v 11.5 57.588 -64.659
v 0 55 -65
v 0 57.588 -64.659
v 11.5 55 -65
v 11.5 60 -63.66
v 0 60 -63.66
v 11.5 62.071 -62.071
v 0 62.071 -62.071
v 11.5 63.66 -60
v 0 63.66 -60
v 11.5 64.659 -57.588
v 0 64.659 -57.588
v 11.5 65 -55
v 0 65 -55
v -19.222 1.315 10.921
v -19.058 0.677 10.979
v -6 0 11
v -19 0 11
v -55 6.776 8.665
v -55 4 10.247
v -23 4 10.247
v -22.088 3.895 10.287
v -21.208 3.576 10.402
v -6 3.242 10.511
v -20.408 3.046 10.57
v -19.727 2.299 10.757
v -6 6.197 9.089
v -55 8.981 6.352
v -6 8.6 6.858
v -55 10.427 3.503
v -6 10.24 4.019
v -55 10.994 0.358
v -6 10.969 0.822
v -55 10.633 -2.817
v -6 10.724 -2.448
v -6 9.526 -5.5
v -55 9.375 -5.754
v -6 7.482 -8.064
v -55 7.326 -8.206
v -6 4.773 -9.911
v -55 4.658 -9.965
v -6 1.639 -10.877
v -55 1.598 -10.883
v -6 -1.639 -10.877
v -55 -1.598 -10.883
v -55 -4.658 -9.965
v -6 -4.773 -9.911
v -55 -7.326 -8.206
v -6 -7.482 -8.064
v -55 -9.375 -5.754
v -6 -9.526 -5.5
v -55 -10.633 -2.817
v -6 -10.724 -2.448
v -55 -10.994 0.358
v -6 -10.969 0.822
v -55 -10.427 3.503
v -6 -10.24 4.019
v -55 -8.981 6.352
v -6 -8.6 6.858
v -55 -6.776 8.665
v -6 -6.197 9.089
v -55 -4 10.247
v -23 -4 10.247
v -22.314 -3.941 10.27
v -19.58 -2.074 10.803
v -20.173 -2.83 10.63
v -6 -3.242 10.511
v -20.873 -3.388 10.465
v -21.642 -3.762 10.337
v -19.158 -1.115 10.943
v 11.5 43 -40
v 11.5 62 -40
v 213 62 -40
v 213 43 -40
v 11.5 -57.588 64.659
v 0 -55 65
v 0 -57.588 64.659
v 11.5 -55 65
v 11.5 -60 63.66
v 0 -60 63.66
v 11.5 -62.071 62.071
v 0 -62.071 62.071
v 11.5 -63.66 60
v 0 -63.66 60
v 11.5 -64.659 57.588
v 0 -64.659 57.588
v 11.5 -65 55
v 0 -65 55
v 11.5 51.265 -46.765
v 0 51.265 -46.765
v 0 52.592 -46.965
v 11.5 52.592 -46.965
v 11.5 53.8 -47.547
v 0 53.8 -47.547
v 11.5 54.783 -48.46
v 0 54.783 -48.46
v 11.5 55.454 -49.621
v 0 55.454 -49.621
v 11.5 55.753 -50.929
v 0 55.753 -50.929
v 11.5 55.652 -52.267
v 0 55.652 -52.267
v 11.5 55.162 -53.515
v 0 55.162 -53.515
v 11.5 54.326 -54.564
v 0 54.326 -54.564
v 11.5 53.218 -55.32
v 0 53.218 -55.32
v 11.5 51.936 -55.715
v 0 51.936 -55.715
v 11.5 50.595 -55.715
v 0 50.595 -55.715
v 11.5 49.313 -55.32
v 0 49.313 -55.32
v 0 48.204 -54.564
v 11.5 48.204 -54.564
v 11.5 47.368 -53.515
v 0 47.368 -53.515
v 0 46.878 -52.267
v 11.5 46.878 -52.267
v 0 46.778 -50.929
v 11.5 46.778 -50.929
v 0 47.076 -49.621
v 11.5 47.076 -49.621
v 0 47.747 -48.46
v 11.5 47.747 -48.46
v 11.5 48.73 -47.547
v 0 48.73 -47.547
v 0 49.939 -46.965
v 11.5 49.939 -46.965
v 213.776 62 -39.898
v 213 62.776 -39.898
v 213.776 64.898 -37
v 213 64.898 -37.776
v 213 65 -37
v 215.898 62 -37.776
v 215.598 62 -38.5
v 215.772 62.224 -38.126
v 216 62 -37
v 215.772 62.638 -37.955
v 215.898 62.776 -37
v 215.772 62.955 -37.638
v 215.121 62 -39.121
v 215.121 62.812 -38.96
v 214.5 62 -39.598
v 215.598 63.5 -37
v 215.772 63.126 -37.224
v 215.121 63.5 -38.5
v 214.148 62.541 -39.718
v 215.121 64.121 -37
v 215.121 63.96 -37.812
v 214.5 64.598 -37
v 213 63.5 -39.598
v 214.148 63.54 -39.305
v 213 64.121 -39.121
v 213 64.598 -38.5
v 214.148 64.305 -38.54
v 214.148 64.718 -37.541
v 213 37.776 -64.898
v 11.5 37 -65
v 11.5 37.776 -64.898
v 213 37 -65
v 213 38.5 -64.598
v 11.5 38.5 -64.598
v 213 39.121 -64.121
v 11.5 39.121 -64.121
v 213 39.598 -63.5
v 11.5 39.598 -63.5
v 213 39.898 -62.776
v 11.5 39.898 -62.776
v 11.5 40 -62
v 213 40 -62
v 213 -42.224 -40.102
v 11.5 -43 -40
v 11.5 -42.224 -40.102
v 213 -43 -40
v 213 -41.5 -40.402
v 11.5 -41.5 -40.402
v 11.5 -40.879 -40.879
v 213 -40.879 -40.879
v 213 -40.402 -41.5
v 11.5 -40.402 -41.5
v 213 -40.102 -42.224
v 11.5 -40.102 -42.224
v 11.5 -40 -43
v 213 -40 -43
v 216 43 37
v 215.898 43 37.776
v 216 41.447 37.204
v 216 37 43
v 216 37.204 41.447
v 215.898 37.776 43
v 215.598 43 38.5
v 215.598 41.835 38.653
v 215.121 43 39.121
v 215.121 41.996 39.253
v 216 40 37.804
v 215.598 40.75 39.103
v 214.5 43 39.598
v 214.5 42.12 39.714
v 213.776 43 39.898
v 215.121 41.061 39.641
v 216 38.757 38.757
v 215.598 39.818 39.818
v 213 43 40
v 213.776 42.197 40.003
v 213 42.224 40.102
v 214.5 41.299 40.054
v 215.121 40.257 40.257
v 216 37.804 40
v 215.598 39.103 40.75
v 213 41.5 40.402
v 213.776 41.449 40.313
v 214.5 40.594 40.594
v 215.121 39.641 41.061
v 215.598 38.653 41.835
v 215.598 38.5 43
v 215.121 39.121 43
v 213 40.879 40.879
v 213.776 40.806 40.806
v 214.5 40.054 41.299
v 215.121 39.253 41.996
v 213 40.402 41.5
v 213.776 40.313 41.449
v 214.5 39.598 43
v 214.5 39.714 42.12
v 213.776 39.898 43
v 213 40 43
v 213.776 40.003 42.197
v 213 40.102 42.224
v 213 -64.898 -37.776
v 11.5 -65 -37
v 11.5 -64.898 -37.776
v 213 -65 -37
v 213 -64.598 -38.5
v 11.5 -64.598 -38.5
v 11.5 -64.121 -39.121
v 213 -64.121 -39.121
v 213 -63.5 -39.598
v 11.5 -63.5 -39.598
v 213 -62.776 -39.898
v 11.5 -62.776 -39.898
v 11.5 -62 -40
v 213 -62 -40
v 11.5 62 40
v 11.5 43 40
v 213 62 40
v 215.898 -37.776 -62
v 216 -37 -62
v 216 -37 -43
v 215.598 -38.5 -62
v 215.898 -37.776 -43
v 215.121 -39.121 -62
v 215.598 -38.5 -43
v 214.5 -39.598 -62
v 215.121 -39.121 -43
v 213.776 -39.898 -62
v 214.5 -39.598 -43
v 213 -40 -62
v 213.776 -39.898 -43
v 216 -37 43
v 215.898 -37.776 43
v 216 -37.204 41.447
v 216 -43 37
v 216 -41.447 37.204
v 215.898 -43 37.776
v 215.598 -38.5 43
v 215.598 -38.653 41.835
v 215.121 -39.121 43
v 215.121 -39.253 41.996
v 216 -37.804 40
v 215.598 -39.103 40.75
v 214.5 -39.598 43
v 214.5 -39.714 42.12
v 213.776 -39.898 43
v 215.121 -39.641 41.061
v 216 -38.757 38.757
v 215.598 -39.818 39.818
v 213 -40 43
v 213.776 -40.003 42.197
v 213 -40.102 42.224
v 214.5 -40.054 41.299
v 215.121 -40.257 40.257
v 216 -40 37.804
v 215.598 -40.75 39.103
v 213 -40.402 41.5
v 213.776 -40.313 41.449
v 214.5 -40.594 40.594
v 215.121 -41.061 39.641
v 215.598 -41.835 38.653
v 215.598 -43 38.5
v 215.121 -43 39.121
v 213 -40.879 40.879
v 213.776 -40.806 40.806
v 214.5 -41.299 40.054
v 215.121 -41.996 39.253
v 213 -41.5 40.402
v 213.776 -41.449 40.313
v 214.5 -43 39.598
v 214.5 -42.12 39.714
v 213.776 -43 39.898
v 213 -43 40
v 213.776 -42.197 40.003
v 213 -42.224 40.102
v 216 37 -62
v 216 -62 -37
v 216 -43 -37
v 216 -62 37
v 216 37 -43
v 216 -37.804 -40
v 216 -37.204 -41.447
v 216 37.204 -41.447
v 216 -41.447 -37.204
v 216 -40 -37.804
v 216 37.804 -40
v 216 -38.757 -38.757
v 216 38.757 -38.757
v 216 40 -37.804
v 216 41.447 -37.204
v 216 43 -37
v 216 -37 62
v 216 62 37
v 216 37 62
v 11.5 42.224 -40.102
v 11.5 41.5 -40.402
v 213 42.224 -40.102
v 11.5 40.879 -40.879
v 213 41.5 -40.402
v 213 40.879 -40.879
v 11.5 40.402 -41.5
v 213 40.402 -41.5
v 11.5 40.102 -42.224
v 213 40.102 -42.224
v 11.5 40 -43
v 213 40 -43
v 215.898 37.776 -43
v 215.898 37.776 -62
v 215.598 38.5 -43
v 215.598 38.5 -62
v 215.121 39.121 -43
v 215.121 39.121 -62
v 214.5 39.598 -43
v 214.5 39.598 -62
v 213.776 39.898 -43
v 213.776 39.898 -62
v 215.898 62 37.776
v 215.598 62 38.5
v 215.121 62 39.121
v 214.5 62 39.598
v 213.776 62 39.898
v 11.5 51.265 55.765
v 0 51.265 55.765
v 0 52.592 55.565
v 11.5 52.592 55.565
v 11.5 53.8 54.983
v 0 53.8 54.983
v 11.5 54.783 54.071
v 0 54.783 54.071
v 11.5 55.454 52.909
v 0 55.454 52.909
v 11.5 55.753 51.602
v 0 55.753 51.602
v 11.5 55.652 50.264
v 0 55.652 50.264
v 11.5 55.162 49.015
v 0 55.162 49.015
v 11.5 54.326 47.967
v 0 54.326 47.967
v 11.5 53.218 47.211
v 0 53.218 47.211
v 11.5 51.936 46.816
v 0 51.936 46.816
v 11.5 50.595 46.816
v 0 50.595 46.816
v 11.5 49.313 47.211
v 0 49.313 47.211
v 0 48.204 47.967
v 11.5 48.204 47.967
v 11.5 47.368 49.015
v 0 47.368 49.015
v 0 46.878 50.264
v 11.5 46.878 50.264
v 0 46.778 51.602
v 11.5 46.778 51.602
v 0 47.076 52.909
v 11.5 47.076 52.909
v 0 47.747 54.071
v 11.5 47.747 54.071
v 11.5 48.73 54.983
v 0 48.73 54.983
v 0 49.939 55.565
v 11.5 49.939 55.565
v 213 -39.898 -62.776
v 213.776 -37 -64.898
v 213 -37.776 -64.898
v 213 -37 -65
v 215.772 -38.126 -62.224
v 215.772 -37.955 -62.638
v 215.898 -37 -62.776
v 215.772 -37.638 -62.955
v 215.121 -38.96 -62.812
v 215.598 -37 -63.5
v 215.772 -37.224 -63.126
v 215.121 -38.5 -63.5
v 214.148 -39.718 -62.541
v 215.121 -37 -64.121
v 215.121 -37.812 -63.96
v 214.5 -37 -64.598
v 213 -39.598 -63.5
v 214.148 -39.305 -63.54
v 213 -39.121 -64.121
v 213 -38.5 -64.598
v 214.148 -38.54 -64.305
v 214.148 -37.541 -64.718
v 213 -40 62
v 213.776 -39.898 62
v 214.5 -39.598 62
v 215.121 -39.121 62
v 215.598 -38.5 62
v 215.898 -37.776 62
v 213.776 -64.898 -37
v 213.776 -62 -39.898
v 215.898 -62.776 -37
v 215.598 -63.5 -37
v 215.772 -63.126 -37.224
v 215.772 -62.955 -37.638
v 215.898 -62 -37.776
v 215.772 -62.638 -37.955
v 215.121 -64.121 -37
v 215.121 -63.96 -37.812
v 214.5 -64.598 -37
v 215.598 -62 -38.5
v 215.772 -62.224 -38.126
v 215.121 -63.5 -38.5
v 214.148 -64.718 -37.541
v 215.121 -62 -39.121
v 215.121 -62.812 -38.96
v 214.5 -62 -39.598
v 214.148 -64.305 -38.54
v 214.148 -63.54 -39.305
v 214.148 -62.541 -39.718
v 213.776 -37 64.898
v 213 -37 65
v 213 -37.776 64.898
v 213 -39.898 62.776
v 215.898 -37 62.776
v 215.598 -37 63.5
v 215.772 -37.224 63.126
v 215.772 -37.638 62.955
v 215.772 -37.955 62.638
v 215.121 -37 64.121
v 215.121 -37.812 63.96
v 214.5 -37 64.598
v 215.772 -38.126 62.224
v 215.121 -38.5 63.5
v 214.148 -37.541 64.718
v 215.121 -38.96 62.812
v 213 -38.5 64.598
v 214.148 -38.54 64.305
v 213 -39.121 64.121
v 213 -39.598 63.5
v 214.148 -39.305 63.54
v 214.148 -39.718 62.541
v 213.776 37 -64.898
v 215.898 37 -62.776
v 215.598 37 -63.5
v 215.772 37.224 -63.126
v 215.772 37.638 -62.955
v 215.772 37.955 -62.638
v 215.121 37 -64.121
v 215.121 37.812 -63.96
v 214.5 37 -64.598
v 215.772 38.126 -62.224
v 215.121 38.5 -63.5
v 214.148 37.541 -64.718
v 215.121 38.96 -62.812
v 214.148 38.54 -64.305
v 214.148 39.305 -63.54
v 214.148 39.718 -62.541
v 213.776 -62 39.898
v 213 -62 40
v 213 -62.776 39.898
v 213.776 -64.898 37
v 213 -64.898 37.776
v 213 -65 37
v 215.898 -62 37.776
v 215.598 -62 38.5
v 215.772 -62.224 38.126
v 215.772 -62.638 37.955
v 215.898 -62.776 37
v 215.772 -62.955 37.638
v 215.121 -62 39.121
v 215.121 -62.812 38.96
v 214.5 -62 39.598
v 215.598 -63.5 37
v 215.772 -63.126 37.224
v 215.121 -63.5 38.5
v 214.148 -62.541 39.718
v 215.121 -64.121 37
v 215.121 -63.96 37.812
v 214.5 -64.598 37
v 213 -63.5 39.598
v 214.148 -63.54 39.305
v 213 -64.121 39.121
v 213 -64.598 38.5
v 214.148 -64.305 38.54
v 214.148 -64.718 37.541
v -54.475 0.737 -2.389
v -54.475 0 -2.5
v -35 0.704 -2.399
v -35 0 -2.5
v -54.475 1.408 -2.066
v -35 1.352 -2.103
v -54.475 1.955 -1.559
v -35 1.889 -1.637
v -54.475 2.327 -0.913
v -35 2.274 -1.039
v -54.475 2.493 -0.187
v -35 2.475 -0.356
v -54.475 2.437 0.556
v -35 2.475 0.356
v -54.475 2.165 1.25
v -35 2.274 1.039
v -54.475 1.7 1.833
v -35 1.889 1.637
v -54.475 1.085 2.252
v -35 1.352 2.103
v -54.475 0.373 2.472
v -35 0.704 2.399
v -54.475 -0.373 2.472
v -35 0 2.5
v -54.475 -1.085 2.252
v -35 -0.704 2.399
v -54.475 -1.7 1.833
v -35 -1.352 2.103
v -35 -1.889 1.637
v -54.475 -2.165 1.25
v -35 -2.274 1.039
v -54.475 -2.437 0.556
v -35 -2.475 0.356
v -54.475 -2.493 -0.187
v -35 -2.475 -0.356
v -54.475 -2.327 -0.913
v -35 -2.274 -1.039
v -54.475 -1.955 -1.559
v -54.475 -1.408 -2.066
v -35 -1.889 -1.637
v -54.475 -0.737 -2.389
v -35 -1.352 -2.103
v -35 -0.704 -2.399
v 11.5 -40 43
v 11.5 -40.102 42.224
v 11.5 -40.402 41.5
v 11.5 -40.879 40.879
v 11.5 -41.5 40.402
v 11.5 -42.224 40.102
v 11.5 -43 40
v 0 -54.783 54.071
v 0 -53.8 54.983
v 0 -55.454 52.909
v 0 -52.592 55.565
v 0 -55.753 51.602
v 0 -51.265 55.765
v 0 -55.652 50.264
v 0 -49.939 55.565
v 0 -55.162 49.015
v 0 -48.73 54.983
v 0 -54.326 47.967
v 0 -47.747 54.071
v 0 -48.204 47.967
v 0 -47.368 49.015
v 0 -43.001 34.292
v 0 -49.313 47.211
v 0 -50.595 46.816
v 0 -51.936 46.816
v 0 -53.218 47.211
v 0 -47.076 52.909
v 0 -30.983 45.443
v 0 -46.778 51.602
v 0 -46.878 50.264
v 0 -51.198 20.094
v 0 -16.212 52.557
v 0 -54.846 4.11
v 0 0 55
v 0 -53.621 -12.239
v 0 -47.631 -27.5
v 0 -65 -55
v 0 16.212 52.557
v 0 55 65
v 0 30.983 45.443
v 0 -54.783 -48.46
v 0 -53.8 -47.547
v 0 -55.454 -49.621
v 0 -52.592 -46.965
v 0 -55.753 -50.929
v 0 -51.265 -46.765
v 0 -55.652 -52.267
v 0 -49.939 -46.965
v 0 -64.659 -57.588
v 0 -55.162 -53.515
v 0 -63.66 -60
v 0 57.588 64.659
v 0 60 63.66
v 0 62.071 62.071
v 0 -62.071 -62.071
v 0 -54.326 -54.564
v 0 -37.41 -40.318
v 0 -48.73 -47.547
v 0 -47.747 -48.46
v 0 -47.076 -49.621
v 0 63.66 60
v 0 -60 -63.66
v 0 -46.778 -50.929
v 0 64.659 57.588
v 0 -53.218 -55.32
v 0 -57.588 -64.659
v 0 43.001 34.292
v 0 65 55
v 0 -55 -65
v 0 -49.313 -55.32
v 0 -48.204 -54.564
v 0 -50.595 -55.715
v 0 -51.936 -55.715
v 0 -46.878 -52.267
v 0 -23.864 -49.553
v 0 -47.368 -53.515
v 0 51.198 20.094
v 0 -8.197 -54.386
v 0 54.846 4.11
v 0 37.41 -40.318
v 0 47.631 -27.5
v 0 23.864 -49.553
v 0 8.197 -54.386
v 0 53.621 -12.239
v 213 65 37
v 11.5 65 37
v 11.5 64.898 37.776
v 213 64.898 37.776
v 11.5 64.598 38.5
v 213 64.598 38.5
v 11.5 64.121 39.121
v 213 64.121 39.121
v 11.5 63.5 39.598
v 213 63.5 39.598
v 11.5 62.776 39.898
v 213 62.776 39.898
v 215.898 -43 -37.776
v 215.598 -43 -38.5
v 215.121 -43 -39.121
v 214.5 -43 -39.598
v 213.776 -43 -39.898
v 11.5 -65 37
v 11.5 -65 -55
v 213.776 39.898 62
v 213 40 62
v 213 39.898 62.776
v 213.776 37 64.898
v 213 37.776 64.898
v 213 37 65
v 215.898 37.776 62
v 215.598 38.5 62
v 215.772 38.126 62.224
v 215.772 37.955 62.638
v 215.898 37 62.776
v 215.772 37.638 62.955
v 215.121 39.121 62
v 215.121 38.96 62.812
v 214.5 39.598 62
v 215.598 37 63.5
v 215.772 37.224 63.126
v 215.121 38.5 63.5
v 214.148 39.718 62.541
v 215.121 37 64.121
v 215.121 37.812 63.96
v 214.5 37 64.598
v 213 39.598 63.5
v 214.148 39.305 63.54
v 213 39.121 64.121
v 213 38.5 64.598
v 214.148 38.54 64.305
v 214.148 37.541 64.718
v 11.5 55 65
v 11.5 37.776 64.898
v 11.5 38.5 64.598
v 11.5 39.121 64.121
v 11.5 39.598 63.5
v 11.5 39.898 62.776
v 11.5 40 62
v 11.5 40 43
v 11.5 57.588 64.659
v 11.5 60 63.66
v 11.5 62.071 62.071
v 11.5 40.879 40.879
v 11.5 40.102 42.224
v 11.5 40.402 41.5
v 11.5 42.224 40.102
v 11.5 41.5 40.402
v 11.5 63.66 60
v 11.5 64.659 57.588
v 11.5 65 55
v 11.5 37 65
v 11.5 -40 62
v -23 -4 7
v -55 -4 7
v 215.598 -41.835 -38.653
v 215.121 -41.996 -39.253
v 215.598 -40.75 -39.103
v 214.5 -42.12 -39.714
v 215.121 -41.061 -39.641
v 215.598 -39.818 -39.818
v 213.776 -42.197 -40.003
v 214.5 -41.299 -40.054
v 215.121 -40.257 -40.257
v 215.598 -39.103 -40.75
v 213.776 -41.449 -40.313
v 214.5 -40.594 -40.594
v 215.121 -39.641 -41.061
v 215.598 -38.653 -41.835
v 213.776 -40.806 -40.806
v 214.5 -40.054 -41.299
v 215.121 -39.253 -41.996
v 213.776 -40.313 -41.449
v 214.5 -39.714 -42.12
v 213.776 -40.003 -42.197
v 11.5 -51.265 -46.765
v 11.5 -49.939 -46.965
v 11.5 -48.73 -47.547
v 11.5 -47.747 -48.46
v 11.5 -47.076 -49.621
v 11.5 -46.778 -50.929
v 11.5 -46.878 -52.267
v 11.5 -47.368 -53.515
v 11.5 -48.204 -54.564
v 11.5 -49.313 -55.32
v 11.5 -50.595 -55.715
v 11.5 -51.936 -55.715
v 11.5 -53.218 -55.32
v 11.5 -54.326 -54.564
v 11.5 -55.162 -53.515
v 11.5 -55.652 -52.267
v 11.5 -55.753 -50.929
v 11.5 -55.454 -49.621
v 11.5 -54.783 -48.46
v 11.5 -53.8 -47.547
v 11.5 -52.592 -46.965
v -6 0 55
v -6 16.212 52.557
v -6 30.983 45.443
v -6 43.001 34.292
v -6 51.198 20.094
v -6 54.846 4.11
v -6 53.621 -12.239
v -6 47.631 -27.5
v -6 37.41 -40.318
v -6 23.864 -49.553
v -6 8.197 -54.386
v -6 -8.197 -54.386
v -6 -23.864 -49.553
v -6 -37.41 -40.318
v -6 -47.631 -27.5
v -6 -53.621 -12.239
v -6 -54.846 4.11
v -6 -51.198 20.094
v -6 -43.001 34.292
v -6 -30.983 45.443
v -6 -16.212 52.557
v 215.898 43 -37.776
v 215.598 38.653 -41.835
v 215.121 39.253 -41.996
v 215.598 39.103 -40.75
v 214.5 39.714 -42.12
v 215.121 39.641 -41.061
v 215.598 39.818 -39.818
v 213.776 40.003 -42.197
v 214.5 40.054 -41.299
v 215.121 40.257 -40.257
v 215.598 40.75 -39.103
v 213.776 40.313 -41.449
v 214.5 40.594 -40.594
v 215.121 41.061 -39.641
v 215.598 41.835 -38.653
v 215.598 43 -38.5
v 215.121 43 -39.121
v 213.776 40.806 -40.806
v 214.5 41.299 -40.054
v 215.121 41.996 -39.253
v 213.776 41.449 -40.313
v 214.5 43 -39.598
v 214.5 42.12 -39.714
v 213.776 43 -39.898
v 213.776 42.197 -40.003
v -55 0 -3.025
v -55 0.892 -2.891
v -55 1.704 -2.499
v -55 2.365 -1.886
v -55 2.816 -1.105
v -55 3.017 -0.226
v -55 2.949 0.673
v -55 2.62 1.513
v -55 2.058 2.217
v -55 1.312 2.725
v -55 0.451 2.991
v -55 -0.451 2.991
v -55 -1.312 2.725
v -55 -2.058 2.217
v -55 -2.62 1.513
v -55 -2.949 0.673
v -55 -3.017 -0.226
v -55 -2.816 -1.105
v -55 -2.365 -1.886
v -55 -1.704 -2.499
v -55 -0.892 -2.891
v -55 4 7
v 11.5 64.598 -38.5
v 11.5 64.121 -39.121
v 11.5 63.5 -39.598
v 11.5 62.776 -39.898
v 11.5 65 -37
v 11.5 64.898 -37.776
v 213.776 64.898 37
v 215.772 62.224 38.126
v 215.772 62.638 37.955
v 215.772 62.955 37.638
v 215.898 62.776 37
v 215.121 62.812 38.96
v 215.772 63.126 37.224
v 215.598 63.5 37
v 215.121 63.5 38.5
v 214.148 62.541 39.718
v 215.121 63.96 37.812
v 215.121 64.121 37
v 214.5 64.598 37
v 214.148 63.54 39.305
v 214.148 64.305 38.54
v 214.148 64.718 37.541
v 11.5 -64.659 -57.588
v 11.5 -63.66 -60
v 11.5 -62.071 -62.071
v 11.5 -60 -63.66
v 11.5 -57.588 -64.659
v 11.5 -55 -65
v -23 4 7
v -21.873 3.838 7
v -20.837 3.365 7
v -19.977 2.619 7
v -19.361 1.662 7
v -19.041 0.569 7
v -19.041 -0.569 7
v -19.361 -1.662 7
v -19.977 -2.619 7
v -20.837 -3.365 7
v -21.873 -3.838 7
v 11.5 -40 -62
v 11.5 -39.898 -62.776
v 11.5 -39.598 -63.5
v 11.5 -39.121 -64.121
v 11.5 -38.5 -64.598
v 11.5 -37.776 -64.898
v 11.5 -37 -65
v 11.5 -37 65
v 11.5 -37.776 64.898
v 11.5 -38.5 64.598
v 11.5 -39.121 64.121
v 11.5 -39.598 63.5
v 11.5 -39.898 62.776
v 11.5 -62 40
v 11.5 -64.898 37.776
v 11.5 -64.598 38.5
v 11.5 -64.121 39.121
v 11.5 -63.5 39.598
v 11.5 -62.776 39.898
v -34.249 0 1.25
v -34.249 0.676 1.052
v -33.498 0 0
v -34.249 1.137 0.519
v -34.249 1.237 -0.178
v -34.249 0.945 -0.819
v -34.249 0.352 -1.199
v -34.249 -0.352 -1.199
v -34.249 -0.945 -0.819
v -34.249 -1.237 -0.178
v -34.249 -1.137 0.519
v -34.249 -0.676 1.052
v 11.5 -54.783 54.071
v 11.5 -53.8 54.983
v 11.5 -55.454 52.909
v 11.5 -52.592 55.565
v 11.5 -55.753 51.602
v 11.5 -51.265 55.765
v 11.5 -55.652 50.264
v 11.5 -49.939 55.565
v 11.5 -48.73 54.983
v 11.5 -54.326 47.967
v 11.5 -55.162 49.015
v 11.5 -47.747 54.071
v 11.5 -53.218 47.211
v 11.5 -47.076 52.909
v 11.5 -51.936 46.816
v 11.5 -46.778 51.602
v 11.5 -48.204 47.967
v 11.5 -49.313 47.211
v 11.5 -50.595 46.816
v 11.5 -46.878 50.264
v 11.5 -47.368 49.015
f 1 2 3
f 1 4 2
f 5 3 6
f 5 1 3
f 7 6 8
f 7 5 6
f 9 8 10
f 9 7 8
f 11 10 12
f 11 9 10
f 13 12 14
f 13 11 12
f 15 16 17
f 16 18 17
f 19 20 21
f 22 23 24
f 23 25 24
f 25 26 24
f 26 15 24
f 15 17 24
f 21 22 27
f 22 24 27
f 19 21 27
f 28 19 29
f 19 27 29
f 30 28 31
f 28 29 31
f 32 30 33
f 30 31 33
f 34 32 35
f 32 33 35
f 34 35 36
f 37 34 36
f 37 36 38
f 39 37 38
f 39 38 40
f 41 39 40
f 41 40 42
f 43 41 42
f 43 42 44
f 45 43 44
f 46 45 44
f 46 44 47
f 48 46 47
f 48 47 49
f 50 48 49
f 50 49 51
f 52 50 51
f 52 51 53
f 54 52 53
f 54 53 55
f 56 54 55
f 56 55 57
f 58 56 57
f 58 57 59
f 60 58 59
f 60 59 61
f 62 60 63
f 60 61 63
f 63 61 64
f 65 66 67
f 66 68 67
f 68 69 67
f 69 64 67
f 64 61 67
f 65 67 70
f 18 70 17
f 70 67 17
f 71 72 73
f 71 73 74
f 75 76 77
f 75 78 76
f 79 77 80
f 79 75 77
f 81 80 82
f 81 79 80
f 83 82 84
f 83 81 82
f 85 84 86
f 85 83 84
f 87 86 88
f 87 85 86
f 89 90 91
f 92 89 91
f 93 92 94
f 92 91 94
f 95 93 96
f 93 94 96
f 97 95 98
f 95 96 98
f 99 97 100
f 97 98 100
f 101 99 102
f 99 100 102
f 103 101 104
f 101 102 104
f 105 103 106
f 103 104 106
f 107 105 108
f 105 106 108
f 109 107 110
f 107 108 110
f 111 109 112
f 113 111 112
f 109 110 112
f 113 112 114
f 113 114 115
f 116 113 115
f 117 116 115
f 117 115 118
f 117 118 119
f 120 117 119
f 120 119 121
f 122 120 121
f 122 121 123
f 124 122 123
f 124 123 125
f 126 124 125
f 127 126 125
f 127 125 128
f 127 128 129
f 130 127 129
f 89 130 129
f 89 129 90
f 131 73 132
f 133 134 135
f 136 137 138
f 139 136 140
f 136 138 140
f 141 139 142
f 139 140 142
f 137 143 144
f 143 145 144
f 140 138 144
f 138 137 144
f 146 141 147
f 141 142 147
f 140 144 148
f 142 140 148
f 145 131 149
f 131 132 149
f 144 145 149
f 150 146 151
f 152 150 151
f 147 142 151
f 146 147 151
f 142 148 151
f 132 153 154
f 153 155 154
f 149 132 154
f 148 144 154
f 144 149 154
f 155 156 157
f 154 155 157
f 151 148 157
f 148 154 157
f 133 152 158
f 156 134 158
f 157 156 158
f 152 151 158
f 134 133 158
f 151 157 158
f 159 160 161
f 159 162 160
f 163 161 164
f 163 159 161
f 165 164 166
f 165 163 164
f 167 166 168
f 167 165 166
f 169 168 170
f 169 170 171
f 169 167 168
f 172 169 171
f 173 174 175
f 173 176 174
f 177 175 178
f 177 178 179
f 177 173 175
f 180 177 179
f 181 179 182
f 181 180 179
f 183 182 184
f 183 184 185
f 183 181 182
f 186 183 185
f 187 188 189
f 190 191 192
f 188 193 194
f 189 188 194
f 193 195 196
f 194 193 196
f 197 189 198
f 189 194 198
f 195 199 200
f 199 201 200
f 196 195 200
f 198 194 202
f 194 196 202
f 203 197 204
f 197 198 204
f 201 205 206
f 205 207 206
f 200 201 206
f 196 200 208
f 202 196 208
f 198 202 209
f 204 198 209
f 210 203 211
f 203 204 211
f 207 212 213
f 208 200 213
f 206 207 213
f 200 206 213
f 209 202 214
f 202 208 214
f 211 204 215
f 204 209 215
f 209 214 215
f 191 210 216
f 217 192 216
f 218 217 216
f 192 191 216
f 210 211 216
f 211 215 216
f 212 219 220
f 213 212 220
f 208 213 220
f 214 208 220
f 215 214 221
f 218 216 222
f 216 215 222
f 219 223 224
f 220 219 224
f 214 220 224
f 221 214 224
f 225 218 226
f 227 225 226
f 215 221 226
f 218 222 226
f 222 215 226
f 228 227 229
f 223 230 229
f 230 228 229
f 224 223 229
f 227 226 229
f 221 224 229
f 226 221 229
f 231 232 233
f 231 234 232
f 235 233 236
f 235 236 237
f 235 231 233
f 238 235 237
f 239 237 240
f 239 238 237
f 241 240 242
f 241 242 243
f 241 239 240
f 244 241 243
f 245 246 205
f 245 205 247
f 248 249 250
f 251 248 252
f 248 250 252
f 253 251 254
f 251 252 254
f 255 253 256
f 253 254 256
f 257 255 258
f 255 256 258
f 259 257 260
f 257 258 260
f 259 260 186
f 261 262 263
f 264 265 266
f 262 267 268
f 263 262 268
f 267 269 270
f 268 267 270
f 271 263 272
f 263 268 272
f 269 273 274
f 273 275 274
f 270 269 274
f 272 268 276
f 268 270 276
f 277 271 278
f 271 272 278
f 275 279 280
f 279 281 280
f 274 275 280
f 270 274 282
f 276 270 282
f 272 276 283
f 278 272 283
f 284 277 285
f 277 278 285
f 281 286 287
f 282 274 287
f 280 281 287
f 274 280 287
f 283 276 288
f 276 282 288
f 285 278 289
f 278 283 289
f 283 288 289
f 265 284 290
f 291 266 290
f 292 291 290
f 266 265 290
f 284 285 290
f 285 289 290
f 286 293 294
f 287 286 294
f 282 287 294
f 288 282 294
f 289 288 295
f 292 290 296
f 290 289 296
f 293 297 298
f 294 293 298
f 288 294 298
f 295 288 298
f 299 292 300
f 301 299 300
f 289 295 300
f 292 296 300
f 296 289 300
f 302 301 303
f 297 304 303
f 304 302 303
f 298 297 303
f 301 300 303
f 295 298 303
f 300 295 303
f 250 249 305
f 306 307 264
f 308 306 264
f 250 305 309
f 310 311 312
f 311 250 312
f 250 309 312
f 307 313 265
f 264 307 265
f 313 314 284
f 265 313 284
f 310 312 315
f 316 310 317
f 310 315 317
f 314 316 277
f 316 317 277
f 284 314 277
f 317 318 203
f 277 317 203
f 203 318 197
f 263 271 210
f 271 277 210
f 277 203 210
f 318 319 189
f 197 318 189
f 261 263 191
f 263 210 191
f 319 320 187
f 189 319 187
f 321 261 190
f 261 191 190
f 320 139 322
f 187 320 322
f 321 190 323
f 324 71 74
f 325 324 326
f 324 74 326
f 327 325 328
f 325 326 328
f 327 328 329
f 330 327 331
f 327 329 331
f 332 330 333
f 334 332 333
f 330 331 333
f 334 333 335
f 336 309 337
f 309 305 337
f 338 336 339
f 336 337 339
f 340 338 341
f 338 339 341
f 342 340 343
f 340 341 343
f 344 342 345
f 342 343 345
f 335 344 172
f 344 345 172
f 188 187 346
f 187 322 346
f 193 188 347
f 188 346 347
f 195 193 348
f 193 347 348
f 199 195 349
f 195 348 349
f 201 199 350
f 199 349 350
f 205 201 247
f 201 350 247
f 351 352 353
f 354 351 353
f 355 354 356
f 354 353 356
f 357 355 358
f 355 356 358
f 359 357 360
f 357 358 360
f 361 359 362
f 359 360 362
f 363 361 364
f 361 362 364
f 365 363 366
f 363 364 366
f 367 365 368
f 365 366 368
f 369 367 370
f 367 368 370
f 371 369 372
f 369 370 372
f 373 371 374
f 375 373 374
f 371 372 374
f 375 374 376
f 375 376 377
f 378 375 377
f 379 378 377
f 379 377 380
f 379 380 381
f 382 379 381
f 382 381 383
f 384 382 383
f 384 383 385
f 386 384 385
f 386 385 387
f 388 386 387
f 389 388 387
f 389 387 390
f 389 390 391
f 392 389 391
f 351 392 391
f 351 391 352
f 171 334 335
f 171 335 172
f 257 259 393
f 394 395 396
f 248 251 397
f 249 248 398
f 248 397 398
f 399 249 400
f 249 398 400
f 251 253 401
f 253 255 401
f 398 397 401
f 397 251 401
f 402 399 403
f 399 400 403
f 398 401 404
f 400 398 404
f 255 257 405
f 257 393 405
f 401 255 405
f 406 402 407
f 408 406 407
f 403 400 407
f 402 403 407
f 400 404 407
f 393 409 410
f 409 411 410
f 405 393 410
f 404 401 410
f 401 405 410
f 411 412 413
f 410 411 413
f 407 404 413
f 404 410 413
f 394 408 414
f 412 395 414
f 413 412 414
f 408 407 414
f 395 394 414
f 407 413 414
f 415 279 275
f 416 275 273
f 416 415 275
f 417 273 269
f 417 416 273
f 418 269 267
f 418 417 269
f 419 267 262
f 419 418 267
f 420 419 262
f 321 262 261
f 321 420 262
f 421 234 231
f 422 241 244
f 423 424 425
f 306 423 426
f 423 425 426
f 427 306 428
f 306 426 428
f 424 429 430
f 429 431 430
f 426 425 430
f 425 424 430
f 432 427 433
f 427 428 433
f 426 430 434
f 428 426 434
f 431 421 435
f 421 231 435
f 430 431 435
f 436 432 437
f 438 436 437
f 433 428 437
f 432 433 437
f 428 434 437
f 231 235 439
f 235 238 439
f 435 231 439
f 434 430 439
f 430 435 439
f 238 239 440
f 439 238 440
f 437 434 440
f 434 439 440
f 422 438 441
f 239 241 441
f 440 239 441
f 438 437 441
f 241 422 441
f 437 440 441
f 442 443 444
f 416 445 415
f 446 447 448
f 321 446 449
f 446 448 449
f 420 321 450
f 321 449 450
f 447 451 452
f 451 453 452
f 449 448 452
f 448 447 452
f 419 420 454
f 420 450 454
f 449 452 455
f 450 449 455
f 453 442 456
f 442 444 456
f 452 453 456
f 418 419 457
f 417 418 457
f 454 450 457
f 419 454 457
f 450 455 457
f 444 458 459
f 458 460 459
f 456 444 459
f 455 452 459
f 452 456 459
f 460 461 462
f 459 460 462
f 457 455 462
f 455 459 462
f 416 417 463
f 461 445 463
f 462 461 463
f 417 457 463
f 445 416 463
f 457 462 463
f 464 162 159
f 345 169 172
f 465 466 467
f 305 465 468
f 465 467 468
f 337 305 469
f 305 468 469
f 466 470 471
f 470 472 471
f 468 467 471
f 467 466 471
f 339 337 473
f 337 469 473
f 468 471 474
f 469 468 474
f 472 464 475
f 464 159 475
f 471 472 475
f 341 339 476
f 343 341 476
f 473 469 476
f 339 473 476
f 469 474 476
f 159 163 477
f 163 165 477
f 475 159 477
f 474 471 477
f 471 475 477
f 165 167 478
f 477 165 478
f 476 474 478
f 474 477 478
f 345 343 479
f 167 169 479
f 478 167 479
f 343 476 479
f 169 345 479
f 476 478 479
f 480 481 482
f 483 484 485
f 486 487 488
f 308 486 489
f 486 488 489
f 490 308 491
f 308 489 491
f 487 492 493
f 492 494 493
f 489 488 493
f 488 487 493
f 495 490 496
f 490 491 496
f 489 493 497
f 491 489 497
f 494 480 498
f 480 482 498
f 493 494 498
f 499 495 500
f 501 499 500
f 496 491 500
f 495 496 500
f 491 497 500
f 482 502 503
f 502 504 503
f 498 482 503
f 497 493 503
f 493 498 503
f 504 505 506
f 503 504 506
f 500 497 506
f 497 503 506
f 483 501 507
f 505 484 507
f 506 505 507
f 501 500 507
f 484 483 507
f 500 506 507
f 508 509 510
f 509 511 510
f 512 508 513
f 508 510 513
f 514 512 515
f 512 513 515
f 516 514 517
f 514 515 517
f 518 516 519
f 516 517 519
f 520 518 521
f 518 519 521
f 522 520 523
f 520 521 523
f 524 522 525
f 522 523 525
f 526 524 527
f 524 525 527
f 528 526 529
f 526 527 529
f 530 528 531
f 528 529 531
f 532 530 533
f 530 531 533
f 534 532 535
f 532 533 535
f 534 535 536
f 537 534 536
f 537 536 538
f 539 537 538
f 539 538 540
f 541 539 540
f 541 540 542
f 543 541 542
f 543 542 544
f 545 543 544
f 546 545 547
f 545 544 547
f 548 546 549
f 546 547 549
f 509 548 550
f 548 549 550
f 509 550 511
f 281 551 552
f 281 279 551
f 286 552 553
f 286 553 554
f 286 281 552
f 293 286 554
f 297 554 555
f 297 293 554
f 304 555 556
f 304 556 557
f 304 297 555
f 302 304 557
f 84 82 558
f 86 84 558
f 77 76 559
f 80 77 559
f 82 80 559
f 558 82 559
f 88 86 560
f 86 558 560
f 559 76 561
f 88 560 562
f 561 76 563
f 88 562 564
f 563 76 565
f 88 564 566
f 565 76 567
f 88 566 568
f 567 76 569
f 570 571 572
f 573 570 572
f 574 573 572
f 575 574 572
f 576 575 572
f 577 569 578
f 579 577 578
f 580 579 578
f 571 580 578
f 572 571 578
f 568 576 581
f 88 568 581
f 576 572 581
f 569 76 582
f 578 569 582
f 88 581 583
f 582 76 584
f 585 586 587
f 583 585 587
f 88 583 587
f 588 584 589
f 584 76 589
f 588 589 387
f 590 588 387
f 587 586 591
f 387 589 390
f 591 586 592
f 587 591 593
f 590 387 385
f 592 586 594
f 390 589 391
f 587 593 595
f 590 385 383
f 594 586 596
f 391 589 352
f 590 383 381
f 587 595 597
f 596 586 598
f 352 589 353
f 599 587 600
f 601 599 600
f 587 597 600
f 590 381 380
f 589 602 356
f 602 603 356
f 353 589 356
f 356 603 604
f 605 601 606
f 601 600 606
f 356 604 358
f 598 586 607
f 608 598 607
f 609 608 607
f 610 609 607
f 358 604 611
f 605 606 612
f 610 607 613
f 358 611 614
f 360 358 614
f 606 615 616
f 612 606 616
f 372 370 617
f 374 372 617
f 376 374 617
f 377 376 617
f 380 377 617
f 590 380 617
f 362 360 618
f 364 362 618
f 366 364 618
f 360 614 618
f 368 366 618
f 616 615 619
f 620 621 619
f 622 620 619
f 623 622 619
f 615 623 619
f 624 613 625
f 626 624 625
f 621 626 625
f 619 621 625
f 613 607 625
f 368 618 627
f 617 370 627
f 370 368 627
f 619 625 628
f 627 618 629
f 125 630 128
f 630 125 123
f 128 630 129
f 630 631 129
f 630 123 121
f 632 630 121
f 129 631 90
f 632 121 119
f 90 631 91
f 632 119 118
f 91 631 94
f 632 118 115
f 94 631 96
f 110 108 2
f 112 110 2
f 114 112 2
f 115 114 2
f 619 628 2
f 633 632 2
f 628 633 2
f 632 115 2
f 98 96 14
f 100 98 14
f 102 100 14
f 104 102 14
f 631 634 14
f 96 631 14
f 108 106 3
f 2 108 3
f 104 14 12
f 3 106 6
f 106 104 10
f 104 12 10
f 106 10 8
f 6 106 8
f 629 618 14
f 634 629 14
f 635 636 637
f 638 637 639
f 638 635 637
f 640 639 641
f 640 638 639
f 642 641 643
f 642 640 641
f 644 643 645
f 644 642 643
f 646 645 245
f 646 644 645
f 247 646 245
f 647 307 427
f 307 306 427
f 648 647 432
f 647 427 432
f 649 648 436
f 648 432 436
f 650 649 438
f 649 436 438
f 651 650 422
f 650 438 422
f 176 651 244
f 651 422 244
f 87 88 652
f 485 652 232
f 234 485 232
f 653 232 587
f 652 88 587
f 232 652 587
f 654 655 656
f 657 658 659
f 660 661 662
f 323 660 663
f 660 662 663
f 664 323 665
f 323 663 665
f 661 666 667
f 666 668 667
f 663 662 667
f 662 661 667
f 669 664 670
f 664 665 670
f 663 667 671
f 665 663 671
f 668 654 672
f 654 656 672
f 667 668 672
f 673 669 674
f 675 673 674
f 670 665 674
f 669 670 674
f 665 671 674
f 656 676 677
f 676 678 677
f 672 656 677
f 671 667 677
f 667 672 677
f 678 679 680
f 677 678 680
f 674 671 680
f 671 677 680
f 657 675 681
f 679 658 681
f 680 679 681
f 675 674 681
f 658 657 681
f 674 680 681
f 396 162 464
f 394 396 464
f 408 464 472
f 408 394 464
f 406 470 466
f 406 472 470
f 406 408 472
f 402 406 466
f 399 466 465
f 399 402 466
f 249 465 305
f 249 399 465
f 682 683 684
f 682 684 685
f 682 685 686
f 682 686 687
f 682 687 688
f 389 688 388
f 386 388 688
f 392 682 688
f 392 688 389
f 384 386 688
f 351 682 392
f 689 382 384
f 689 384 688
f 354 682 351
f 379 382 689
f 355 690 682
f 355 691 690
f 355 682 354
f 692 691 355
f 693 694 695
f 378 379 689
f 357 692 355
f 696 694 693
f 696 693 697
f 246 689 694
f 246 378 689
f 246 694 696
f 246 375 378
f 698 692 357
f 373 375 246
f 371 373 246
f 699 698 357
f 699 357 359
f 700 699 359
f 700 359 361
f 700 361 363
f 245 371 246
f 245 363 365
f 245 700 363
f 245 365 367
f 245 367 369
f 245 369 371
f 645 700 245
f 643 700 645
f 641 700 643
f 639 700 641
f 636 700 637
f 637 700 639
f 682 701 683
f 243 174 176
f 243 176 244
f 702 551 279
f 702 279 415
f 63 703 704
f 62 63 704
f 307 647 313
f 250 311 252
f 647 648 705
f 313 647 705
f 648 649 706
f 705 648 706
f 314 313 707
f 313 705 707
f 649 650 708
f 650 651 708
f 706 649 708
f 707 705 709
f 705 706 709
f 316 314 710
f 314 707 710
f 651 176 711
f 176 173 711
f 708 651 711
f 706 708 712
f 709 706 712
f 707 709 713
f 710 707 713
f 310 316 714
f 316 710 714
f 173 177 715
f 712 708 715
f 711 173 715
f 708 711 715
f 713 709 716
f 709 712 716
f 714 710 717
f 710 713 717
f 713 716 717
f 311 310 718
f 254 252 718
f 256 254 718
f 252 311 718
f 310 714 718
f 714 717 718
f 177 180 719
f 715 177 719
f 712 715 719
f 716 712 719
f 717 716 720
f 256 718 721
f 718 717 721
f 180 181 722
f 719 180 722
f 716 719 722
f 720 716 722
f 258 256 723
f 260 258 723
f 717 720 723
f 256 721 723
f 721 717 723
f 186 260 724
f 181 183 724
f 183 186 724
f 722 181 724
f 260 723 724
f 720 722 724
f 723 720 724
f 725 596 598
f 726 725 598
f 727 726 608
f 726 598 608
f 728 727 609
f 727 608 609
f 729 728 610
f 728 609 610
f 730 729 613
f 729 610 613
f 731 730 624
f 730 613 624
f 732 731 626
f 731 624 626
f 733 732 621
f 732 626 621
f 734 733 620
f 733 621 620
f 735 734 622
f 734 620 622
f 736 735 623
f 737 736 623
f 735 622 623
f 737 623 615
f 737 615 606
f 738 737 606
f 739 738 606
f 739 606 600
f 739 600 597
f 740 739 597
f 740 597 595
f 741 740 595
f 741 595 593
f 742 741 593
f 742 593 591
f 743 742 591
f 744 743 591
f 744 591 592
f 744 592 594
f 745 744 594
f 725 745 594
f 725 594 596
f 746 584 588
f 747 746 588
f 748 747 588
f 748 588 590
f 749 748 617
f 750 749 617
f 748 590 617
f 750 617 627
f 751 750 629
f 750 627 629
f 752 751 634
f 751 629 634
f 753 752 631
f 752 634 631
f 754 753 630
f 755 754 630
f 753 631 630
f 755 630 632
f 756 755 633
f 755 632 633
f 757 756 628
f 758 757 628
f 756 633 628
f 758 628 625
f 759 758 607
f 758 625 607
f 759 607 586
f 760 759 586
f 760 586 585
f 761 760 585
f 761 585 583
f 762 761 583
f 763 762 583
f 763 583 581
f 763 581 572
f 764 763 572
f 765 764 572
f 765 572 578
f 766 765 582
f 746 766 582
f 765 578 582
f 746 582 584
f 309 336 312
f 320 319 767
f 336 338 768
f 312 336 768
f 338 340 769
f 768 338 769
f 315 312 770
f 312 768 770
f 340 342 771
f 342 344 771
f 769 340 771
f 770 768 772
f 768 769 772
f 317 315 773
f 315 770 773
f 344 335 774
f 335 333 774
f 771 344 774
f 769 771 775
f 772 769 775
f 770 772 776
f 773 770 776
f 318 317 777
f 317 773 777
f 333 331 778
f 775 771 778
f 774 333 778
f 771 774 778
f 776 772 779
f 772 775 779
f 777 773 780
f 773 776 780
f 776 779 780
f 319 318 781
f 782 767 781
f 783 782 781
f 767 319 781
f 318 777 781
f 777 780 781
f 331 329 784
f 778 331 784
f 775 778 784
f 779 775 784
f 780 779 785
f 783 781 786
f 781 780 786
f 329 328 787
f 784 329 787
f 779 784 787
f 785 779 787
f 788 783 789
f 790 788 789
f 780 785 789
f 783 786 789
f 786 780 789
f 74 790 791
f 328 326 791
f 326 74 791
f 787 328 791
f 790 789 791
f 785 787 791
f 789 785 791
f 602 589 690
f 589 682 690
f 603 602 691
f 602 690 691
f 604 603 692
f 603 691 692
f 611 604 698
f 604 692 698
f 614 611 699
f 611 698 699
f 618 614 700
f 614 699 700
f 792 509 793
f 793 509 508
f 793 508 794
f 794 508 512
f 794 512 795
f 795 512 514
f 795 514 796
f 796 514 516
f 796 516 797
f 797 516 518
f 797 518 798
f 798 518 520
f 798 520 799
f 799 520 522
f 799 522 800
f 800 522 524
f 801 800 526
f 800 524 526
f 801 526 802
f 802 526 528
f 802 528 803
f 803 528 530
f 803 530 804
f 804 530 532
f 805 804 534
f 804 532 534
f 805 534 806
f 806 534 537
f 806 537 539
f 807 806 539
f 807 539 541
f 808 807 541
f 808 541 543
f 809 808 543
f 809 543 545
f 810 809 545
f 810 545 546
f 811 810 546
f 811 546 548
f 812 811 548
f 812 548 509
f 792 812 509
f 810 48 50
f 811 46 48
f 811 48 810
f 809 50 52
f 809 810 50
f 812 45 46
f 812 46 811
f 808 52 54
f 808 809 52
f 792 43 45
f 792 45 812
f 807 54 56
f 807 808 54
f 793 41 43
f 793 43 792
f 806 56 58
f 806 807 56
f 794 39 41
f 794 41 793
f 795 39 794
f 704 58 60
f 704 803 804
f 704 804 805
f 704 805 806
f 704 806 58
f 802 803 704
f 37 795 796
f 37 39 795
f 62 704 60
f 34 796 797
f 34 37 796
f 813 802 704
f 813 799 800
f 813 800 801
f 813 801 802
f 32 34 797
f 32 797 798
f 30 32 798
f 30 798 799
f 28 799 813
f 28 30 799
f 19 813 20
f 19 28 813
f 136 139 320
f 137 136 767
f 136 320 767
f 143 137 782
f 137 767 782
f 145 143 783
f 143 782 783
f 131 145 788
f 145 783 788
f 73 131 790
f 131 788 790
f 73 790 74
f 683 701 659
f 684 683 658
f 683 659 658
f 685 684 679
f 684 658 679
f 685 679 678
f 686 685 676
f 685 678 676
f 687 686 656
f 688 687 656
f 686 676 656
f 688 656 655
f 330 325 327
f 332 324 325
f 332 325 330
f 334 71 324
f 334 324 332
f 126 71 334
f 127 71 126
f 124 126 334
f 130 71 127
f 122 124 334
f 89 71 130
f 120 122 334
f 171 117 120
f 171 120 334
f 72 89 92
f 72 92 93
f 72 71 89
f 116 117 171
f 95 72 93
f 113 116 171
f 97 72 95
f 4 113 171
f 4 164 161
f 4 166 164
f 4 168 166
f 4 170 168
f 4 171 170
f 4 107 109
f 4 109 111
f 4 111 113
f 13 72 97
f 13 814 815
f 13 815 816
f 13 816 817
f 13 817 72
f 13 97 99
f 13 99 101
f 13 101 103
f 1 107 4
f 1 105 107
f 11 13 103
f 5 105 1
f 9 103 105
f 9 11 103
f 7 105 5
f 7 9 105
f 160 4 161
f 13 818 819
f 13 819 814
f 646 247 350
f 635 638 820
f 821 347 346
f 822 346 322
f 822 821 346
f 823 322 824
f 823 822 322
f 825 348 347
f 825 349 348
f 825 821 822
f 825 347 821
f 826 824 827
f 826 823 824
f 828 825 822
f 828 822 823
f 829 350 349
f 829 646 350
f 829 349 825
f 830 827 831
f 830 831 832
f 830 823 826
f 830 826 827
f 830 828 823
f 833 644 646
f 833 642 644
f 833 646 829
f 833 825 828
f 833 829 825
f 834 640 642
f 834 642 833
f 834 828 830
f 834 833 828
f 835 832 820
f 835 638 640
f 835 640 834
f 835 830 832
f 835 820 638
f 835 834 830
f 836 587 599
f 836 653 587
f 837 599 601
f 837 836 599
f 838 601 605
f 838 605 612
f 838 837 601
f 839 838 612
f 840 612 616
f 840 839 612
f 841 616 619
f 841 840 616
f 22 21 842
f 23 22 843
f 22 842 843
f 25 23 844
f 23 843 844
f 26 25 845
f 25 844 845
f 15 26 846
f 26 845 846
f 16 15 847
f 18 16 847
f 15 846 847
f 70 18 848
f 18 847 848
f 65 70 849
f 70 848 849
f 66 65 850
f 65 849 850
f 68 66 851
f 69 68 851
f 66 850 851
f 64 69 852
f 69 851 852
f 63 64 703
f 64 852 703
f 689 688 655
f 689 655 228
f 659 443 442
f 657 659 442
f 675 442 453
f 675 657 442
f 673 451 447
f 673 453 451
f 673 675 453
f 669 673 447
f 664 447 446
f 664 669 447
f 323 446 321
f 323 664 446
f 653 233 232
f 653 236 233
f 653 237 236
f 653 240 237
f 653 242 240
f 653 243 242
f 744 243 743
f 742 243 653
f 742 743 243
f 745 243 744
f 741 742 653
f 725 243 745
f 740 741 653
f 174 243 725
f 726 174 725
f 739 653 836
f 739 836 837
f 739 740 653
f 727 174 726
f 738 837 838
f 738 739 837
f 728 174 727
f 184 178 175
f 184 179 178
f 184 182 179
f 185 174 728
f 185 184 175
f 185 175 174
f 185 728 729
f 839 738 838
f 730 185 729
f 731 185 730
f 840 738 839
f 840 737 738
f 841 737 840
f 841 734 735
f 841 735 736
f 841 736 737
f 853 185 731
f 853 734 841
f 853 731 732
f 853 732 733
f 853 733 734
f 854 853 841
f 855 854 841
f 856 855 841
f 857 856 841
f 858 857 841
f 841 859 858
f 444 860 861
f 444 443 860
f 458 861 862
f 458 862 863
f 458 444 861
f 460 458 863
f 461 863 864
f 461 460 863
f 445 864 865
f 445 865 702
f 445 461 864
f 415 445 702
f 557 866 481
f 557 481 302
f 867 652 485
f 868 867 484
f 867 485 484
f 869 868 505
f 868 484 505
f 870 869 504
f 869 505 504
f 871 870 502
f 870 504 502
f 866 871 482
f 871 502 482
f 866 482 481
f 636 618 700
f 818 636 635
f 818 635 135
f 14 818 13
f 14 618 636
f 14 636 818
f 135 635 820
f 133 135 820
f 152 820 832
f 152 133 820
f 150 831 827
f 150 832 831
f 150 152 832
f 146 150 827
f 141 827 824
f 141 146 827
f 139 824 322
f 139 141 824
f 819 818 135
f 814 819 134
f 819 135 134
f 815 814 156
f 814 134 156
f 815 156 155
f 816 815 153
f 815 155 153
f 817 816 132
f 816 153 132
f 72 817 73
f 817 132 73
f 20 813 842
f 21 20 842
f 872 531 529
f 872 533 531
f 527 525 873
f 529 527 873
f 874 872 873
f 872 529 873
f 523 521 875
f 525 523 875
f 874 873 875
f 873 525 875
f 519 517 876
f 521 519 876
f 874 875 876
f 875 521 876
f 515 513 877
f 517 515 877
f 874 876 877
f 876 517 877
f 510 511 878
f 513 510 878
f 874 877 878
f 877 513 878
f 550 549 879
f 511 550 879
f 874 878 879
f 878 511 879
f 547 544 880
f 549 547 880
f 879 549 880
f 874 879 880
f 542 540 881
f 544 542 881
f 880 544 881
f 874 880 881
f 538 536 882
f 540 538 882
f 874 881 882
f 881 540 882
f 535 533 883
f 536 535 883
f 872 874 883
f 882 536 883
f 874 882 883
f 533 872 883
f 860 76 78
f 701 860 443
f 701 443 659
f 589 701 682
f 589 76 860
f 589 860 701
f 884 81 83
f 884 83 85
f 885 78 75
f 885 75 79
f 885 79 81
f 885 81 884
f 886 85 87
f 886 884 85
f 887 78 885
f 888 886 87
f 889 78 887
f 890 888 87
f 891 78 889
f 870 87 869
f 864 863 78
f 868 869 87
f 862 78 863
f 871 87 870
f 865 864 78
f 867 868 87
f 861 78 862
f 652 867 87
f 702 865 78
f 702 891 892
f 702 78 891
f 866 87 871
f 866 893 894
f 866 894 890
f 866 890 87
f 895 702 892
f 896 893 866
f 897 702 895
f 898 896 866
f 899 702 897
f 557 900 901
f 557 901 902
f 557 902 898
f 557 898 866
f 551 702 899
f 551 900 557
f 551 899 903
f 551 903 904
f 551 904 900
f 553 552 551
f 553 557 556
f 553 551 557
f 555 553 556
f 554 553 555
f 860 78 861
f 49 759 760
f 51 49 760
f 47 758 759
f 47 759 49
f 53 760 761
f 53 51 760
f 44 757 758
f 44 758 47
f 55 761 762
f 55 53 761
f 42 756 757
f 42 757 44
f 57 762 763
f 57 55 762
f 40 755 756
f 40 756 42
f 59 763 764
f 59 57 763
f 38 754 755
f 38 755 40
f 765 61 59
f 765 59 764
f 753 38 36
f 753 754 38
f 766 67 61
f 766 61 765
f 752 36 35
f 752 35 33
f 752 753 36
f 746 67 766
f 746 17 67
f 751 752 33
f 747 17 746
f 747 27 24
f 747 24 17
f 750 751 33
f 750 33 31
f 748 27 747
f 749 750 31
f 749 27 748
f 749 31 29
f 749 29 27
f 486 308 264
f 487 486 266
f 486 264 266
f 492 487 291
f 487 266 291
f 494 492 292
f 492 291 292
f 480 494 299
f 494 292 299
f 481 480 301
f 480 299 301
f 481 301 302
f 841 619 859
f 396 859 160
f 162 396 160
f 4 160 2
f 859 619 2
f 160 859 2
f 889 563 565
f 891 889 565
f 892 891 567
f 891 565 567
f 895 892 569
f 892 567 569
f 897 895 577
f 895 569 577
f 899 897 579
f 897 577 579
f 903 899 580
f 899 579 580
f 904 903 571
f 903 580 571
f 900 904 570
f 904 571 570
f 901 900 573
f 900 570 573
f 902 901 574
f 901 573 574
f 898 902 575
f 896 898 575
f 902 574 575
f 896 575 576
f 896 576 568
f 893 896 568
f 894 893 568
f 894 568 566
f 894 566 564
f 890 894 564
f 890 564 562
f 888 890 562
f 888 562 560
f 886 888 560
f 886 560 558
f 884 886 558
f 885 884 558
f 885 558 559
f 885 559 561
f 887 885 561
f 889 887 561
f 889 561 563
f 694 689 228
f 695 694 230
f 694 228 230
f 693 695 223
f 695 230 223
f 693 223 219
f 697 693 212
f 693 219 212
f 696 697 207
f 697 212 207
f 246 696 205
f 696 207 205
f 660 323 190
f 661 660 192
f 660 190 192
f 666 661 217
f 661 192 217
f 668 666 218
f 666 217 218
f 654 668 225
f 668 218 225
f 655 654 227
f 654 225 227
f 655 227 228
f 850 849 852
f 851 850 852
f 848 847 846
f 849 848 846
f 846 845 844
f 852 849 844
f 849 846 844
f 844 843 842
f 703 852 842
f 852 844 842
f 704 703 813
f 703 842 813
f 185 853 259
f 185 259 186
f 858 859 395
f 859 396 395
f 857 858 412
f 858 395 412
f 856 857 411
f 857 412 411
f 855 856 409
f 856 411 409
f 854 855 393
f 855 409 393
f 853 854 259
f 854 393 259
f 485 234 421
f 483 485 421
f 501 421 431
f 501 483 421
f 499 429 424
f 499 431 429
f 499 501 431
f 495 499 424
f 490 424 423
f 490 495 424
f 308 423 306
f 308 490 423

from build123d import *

# Parameters (mm, degrees)
SKETCH1_W                       = 130
SKETCH1_H                       = 130
BOSS_EXTRUDE1_DEPTH             = 11.5
FILLET1_R                       = 10
BOSS_EXTRUDE2_DEPTH             = 204.5
SKETCH3_R                       = 55
BOSS_EXTRUDE3_DEPTH             = 6
SKETCH4_R                       = 11
BOSS_EXTRUDE4_DEPTH             = 55
CUT_EXTRUDE1_START              = 7
CUT_EXTRUDE1_DEPTH              = 113
M6X1_0_TAPPED_HOLE1_D           = 5
M6X1_0_TAPPED_HOLE1_DEPTH       = 20
M6X1_0_TAPPED_HOLE1_CSINK_D     = 6.05
M6X1_0_TAPPED_HOLE1_CSINK_ANGLE = 90
M6X1_0_TAPPED_HOLE1_TIP         = 1.502151548
SKETCH9_R                       = 4.5
CUT_EXTRUDE2_DEPTH              = 20
FILLET2_R                       = 3


with BuildPart() as part:
    # Sketch1 → Boss-Extrude1 (new body)
    with BuildSketch(Plane(origin=(0, 0, 0), x_dir=(0, 0, -1), z_dir=(1, 0, 0))):
        Rectangle(SKETCH1_W, SKETCH1_H)
    extrude(amount=BOSS_EXTRUDE1_DEPTH)

    # Fillet1
    fillet1_edges = [part.edges().sort_by_distance(p)[0] for p in [
        (5.75, -65, -65),
        (5.75, -65, 65),
        (5.75, 65, 65),
        (5.75, 65, -65),
    ]]
    fillet(fillet1_edges, radius=FILLET1_R)

    # Sketch2 → Boss-Extrude2 (add)
    with BuildSketch(Plane(origin=(11.5, 0, 0), x_dir=(0, 0, -1), z_dir=(1, 0, 0))):
        Polygon((-40, 65), (40, 65), (40, 40), (65, 40), (65, -40), (40, -40), (40, -65), (-40, -65), (-40, -40), (-65, -40), (-65, 40), (-40, 40), align=None)
    extrude(amount=BOSS_EXTRUDE2_DEPTH)

    # Sketch3 → Boss-Extrude3 (add)
    with BuildSketch(Plane.ZY):
        Circle(SKETCH3_R)
    extrude(amount=BOSS_EXTRUDE3_DEPTH)

    # Sketch4 → Boss-Extrude4 (add)
    with BuildSketch(Plane.ZY):
        Circle(SKETCH4_R)
    extrude(amount=BOSS_EXTRUDE4_DEPTH)

    # Sketch6 → Cut-Extrude1 (cut)
    with BuildSketch(Plane.XY.offset(CUT_EXTRUDE1_START)):
        with BuildLine():
            Line((-55, 4), (-23, 4))
            ThreePointArc((-23, 4), (-19, 0), (-23, -4))
            Line((-23, -4), (-55, -4))
            ThreePointArc((-55, -4), (-59, 0), (-55, 4))
        make_face()
    extrude(amount=CUT_EXTRUDE1_DEPTH, mode=Mode.SUBTRACT)

    # M6x1.0 Tapped Hole1
    with Locations(Plane.ZY.offset(55)):
        with Locations((0, 0)):
            CounterSinkHole(M6X1_0_TAPPED_HOLE1_D / 2, M6X1_0_TAPPED_HOLE1_CSINK_D / 2, depth=M6X1_0_TAPPED_HOLE1_DEPTH, counter_sink_angle=M6X1_0_TAPPED_HOLE1_CSINK_ANGLE)
            with Locations((0, 0, -(M6X1_0_TAPPED_HOLE1_DEPTH + M6X1_0_TAPPED_HOLE1_TIP / 2))):  # 118° drill point
                Cone(0, M6X1_0_TAPPED_HOLE1_D / 2, M6X1_0_TAPPED_HOLE1_TIP, mode=Mode.SUBTRACT)

    # Sketch9 → Cut-Extrude2 (cut)
    with BuildSketch(Plane.ZY):
        with Locations((51.265241636, 51.265241636)):
            Circle(SKETCH9_R)
        with Locations((51.265241636, -51.265241636)):
            Circle(SKETCH9_R)
        with Locations((-51.265241636, -51.265241636)):
            Circle(SKETCH9_R)
        with Locations((-51.265241636, 51.265241636)):
            Circle(SKETCH9_R)
    extrude(amount=-CUT_EXTRUDE2_DEPTH, mode=Mode.SUBTRACT)

    # Fillet2
    fillet2_edges = [part.edges().sort_by_distance(p)[0] for p in [
        (113.75, 65, 40),
        (113.75, 40, 40),
        (113.75, 40, 65),
        (113.75, -40, 65),
        (113.75, -40, 40),
        (113.75, -65, 40),
        (113.75, -65, -40),
        (113.75, -40, -40),
        (113.75, -40, -65),
        (113.75, 40, -65),
        (113.75, 40, -40),
        (113.75, 65, -40),
        (216, 52.5, 40),
        (216, 40, 52.5),
        (216, 0, 65),
        (216, -40, 52.5),
        (216, -52.5, 40),
        (216, -65, 0),
        (216, -52.5, -40),
        (216, -40, -52.5),
        (216, 0, -65),
        (216, 40, -52.5),
        (216, 52.5, -40),
        (216, 65, 0),
    ]]
    fillet(fillet2_edges, radius=FILLET2_R)


solid = part.part
